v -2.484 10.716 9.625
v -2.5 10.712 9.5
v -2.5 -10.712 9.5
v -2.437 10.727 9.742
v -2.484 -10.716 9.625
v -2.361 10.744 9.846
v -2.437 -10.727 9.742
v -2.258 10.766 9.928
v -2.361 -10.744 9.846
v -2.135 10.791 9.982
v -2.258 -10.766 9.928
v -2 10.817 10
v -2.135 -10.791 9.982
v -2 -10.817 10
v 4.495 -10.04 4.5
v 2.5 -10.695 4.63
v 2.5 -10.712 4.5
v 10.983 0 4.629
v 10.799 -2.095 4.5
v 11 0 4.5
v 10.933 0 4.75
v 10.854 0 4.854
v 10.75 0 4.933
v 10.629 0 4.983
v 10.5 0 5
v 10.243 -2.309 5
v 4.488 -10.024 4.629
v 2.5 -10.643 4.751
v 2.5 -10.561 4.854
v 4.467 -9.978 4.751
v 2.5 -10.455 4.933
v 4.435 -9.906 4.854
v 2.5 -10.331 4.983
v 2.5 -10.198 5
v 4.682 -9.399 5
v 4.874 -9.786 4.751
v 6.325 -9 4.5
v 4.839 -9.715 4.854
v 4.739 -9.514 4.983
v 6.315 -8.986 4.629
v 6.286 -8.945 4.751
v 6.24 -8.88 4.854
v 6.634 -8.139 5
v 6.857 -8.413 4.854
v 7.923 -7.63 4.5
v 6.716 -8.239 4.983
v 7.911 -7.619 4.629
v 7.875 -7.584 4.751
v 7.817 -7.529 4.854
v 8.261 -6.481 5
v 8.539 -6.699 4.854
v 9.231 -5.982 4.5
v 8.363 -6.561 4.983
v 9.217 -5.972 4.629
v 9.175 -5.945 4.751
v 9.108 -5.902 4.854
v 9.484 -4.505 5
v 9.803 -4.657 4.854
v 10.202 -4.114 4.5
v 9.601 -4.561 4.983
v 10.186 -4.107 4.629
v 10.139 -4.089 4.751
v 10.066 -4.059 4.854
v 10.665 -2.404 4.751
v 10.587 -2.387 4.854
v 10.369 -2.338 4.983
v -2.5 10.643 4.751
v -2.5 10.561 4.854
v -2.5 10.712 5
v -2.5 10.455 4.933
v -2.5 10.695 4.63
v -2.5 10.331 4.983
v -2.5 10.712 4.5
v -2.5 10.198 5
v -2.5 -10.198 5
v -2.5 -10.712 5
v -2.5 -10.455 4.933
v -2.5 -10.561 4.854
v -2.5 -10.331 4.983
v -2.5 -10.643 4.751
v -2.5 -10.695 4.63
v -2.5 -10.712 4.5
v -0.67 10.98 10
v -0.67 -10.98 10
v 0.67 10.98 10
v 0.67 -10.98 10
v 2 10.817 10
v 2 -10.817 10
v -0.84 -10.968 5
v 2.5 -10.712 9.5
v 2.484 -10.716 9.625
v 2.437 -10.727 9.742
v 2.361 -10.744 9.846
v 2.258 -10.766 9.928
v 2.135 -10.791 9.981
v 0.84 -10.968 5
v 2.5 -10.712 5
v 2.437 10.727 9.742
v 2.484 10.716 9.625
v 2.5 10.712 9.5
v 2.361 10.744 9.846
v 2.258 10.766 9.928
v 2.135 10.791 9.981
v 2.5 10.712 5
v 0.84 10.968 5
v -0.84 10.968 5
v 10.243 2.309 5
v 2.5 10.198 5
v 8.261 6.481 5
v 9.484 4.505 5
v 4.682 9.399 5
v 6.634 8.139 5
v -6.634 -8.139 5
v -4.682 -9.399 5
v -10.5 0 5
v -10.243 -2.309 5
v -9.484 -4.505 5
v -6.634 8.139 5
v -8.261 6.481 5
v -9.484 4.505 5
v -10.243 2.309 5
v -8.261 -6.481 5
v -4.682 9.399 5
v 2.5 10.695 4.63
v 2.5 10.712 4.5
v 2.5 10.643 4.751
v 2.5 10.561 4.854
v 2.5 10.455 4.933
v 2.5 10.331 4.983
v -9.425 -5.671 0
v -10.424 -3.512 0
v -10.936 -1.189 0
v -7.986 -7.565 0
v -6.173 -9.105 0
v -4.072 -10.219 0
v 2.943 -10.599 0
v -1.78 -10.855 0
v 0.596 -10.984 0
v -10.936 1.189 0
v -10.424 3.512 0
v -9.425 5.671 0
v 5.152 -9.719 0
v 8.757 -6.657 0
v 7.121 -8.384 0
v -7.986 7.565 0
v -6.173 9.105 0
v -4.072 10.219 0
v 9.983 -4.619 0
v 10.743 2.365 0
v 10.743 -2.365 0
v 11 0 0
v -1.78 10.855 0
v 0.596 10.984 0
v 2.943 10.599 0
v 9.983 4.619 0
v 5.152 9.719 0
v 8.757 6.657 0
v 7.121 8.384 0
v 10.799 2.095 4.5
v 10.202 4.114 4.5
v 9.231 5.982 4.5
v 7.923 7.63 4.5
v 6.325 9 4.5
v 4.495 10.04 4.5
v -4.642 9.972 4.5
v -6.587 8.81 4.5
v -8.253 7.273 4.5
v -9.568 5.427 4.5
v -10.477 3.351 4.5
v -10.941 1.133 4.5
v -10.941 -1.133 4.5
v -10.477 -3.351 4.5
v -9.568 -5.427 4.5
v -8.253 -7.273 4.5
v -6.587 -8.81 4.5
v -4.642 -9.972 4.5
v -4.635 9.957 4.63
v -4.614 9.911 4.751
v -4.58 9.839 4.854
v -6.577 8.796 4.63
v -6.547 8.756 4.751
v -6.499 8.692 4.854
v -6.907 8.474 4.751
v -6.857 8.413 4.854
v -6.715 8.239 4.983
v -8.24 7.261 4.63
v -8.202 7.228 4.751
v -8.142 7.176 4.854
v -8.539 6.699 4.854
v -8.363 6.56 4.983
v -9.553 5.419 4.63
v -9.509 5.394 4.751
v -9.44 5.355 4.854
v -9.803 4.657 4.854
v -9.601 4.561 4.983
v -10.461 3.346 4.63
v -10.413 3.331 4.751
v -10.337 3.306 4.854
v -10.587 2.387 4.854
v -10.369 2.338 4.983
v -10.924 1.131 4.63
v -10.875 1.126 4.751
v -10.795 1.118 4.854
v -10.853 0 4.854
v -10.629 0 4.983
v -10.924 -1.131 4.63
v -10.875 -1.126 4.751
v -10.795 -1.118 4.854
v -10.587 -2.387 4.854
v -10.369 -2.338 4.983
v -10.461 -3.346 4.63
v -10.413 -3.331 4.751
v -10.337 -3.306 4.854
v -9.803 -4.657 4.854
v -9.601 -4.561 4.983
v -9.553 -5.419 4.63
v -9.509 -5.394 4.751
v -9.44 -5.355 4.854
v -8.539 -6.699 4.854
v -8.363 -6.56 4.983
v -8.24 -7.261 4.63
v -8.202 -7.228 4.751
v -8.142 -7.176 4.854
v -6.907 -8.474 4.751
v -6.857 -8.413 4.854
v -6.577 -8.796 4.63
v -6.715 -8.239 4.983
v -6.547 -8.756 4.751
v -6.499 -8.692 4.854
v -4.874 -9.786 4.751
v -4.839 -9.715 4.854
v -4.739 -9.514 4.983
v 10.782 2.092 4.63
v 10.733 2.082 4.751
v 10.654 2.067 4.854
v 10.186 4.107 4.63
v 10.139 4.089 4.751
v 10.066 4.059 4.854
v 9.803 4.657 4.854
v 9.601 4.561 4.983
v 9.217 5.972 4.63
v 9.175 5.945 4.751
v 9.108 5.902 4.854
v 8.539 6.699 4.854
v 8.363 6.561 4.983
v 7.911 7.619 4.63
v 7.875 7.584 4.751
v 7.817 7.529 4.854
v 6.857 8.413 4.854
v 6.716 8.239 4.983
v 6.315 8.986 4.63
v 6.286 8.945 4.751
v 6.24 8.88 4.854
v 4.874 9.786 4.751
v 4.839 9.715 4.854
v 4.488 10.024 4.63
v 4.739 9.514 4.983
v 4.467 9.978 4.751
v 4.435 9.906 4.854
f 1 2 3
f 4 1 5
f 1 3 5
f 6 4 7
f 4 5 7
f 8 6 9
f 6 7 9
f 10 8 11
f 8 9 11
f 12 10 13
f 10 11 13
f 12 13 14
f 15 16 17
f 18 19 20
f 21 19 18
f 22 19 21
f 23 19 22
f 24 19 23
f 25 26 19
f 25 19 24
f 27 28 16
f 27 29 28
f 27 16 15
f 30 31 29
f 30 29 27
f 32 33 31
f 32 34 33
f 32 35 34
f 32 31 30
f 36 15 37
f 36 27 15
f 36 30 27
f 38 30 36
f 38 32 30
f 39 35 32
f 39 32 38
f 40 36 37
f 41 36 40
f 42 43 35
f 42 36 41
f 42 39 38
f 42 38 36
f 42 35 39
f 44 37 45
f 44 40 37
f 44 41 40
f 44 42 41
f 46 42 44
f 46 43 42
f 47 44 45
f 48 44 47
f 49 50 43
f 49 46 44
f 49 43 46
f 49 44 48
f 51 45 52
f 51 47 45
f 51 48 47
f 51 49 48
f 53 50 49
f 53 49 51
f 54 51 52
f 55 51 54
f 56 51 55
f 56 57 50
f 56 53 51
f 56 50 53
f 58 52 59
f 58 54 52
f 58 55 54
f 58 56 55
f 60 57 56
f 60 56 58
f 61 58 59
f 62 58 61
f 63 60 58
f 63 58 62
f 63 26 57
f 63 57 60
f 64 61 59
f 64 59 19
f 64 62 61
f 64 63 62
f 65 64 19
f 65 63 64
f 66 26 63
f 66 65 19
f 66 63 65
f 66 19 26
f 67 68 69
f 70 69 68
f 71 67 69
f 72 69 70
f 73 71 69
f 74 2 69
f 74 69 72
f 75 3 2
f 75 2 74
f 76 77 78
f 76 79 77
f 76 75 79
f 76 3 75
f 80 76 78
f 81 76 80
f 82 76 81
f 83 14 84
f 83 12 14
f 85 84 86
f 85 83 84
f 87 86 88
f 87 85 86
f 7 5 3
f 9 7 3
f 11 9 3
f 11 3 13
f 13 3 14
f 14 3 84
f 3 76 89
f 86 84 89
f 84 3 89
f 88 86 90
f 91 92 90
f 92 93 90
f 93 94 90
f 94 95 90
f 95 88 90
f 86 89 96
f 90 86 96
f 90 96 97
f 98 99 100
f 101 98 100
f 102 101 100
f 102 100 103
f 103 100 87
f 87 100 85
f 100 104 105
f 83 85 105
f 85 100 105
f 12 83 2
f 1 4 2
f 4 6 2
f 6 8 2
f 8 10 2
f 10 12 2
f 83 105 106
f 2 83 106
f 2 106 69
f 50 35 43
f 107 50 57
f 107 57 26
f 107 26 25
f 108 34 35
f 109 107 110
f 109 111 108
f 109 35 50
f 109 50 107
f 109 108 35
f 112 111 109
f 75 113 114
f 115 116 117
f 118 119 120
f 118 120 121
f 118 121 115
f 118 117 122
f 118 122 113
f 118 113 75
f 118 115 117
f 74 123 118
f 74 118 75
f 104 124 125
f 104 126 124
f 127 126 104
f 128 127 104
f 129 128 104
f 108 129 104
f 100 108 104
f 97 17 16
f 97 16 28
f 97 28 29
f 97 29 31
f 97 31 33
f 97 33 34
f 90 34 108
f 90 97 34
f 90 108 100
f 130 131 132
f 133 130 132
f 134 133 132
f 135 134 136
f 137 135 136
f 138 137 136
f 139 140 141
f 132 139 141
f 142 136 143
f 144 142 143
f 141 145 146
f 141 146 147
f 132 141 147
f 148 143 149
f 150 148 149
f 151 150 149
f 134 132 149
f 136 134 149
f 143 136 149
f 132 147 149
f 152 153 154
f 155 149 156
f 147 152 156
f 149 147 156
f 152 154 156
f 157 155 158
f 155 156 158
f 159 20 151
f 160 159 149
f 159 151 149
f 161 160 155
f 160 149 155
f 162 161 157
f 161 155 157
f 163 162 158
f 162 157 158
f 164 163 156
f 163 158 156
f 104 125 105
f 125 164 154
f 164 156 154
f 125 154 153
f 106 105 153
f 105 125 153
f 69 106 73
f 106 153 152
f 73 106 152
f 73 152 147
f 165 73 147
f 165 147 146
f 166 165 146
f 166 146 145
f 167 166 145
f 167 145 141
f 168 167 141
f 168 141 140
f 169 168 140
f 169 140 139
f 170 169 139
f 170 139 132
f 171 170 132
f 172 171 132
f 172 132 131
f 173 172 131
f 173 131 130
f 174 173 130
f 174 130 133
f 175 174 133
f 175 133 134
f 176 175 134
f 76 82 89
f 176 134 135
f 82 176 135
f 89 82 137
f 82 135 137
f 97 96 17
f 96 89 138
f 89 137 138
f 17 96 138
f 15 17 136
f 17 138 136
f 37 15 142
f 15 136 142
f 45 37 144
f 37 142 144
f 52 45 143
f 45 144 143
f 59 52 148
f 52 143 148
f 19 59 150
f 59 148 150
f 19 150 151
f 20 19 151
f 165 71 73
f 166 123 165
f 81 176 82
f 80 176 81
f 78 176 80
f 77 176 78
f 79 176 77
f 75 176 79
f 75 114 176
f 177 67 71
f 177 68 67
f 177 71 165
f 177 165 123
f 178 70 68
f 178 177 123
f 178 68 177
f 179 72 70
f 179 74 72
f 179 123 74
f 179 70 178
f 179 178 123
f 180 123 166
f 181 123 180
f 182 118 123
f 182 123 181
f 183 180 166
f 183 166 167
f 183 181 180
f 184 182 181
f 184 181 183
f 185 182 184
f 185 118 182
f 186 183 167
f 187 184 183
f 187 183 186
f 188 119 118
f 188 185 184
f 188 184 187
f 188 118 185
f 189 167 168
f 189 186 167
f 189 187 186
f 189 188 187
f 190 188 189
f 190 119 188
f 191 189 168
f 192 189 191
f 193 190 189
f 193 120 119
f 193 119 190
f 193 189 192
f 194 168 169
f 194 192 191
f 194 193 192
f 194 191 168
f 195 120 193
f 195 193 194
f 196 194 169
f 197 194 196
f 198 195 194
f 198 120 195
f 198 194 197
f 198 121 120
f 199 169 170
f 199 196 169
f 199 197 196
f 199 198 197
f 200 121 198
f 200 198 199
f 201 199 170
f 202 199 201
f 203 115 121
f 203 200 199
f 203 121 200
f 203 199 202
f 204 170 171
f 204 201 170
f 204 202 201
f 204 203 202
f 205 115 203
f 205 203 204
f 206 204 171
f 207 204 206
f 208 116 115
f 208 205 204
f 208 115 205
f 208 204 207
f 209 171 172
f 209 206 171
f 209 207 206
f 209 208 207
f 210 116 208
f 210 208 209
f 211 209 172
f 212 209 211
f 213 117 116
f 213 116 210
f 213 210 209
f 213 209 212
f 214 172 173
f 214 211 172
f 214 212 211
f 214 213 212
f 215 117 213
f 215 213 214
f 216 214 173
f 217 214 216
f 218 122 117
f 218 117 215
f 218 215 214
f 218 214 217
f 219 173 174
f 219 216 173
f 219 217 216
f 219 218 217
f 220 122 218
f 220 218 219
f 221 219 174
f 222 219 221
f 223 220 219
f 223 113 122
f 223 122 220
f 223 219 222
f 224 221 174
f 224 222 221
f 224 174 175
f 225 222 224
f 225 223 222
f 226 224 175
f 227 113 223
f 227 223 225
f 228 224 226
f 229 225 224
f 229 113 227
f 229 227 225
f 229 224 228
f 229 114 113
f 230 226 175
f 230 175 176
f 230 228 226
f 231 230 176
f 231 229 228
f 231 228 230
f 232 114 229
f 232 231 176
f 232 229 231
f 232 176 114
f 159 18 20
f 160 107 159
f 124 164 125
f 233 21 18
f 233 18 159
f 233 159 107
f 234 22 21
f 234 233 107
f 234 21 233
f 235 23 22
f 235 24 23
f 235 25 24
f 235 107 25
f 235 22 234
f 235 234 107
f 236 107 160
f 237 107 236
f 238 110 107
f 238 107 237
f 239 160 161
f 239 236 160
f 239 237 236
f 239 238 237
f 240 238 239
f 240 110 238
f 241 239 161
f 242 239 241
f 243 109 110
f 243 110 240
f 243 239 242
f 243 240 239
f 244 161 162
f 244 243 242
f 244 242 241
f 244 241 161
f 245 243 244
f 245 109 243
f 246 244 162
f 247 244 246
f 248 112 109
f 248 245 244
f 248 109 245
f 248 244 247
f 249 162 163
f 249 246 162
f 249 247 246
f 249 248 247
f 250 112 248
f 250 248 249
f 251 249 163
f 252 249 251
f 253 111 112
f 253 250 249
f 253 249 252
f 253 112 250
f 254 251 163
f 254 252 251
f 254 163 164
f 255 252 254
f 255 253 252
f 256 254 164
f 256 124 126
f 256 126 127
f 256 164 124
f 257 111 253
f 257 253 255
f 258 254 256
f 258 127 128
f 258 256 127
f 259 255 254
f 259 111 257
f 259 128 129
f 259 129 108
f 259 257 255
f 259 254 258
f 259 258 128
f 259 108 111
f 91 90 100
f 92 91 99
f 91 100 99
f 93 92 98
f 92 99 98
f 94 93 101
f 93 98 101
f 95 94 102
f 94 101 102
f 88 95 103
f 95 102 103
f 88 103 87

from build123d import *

# Parameters (mm, degrees)
ESQUISSE1_R        = 11
BOSS_EXTRU_1_DEPTH = 5
BOSS_EXTRU_2_DEPTH = 5
CONG_1_R           = 0.5
CONG_2_R           = 0.5


with BuildPart() as part:
    # Esquisse1 → Boss.-Extru.1 (new body)
    with BuildSketch(Plane.XY):
        Circle(ESQUISSE1_R)
    extrude(amount=BOSS_EXTRU_1_DEPTH)

    # Esquisse2 → Boss.-Extru.2 (add)
    with BuildSketch(Plane.XY.offset(5)):
        with BuildLine():
            Line((-2.5, 10.712142643), (-2.5, -10.712142643))
            ThreePointArc((-2.5, -10.712142643), (0, -11), (2.5, -10.712142643))
            Line((2.5, -10.712142643), (2.5, 10.712142643))
            ThreePointArc((2.5, 10.712142643), (0, 11), (-2.5, 10.712142643))
        make_face()
    extrude(amount=BOSS_EXTRU_2_DEPTH)

    # Congé1
    # the kernel refuses this fillet: 0.5 mm, written as the material it takes off along each edge
    with BuildSketch(Plane(origin=(0, 0, 5), x_dir=(1, 0, 0), z_dir=(0, -1, 0))) as cong_1_piece_1_section:
        with BuildLine():
            CenterArc((11 - CONG_1_R, -CONG_1_R), CONG_1_R, 0, 90)
            Line((11 - CONG_1_R, 0), (11, 0))
            Line((11, 0), (11, -CONG_1_R))
        make_face()
    cong_1_piece_1 = revolve(axis=Axis((0, 0, 5), (0, 0, 1)), revolution_arc=83.376232782, mode=Mode.PRIVATE)
    cong_1_piece_1 = split(cong_1_piece_1, bisect_by=Plane(origin=(2.5, 6.750657891, 4.860453912), z_dir=(1, 0, 0)), keep=Keep.TOP, mode=Mode.PRIVATE)
    add(cong_1_piece_1, mode=Mode.SUBTRACT)
    with BuildSketch(Plane(origin=(0, 0, 5), x_dir=(-0.11524991416990704, 0.9933365277104376, 0), z_dir=(0.9933365277104376, 0.11524991416990704, 0))) as cong_1_piece_2_section:
        with BuildLine():
            CenterArc((11 - CONG_1_R, -CONG_1_R), CONG_1_R, 0, 90)
            Line((11 - CONG_1_R, 0), (11, 0))
            Line((11, 0), (11, -CONG_1_R))
        make_face()
    cong_1_piece_2 = revolve(axis=Axis((0, 0, 5), (0, 0, 1)), revolution_arc=166.76392016, mode=Mode.PRIVATE)
    cong_1_piece_2 = split(cong_1_piece_2, bisect_by=Plane(origin=(-2.5, 0, 4.862247452), z_dir=(-1, 0, 0)), keep=Keep.TOP, mode=Mode.PRIVATE)
    add(cong_1_piece_2, mode=Mode.SUBTRACT)
    with BuildSketch(Plane(origin=(0, 0, 5), x_dir=(0.1153492077124676, -0.9933250023431938, 0), z_dir=(-0.9933250023431938, -0.1153492077124676, 0))) as cong_1_piece_3_section:
        with BuildLine():
            CenterArc((11 - CONG_1_R, -CONG_1_R), CONG_1_R, 0, 90)
            Line((11 - CONG_1_R, 0), (11, 0))
            Line((11, 0), (11, -CONG_1_R))
        make_face()
    cong_1_piece_3 = revolve(axis=Axis((0, 0, 5), (0, 0, 1)), revolution_arc=83.376232782, mode=Mode.PRIVATE)
    cong_1_piece_3 = split(cong_1_piece_3, bisect_by=Plane(origin=(2.5, -6.750657902, 4.860453931), z_dir=(1, 0, 0)), keep=Keep.TOP, mode=Mode.PRIVATE)
    add(cong_1_piece_3, mode=Mode.SUBTRACT)

    # Congé2
    cong_2_edges = [part.edges().sort_by_distance(p)[0] for p in [
        (-2.5, 0, 10),
        (2.5, 0, 10),
    ]]
    fillet(cong_2_edges, radius=CONG_2_R)


solid = part.part
